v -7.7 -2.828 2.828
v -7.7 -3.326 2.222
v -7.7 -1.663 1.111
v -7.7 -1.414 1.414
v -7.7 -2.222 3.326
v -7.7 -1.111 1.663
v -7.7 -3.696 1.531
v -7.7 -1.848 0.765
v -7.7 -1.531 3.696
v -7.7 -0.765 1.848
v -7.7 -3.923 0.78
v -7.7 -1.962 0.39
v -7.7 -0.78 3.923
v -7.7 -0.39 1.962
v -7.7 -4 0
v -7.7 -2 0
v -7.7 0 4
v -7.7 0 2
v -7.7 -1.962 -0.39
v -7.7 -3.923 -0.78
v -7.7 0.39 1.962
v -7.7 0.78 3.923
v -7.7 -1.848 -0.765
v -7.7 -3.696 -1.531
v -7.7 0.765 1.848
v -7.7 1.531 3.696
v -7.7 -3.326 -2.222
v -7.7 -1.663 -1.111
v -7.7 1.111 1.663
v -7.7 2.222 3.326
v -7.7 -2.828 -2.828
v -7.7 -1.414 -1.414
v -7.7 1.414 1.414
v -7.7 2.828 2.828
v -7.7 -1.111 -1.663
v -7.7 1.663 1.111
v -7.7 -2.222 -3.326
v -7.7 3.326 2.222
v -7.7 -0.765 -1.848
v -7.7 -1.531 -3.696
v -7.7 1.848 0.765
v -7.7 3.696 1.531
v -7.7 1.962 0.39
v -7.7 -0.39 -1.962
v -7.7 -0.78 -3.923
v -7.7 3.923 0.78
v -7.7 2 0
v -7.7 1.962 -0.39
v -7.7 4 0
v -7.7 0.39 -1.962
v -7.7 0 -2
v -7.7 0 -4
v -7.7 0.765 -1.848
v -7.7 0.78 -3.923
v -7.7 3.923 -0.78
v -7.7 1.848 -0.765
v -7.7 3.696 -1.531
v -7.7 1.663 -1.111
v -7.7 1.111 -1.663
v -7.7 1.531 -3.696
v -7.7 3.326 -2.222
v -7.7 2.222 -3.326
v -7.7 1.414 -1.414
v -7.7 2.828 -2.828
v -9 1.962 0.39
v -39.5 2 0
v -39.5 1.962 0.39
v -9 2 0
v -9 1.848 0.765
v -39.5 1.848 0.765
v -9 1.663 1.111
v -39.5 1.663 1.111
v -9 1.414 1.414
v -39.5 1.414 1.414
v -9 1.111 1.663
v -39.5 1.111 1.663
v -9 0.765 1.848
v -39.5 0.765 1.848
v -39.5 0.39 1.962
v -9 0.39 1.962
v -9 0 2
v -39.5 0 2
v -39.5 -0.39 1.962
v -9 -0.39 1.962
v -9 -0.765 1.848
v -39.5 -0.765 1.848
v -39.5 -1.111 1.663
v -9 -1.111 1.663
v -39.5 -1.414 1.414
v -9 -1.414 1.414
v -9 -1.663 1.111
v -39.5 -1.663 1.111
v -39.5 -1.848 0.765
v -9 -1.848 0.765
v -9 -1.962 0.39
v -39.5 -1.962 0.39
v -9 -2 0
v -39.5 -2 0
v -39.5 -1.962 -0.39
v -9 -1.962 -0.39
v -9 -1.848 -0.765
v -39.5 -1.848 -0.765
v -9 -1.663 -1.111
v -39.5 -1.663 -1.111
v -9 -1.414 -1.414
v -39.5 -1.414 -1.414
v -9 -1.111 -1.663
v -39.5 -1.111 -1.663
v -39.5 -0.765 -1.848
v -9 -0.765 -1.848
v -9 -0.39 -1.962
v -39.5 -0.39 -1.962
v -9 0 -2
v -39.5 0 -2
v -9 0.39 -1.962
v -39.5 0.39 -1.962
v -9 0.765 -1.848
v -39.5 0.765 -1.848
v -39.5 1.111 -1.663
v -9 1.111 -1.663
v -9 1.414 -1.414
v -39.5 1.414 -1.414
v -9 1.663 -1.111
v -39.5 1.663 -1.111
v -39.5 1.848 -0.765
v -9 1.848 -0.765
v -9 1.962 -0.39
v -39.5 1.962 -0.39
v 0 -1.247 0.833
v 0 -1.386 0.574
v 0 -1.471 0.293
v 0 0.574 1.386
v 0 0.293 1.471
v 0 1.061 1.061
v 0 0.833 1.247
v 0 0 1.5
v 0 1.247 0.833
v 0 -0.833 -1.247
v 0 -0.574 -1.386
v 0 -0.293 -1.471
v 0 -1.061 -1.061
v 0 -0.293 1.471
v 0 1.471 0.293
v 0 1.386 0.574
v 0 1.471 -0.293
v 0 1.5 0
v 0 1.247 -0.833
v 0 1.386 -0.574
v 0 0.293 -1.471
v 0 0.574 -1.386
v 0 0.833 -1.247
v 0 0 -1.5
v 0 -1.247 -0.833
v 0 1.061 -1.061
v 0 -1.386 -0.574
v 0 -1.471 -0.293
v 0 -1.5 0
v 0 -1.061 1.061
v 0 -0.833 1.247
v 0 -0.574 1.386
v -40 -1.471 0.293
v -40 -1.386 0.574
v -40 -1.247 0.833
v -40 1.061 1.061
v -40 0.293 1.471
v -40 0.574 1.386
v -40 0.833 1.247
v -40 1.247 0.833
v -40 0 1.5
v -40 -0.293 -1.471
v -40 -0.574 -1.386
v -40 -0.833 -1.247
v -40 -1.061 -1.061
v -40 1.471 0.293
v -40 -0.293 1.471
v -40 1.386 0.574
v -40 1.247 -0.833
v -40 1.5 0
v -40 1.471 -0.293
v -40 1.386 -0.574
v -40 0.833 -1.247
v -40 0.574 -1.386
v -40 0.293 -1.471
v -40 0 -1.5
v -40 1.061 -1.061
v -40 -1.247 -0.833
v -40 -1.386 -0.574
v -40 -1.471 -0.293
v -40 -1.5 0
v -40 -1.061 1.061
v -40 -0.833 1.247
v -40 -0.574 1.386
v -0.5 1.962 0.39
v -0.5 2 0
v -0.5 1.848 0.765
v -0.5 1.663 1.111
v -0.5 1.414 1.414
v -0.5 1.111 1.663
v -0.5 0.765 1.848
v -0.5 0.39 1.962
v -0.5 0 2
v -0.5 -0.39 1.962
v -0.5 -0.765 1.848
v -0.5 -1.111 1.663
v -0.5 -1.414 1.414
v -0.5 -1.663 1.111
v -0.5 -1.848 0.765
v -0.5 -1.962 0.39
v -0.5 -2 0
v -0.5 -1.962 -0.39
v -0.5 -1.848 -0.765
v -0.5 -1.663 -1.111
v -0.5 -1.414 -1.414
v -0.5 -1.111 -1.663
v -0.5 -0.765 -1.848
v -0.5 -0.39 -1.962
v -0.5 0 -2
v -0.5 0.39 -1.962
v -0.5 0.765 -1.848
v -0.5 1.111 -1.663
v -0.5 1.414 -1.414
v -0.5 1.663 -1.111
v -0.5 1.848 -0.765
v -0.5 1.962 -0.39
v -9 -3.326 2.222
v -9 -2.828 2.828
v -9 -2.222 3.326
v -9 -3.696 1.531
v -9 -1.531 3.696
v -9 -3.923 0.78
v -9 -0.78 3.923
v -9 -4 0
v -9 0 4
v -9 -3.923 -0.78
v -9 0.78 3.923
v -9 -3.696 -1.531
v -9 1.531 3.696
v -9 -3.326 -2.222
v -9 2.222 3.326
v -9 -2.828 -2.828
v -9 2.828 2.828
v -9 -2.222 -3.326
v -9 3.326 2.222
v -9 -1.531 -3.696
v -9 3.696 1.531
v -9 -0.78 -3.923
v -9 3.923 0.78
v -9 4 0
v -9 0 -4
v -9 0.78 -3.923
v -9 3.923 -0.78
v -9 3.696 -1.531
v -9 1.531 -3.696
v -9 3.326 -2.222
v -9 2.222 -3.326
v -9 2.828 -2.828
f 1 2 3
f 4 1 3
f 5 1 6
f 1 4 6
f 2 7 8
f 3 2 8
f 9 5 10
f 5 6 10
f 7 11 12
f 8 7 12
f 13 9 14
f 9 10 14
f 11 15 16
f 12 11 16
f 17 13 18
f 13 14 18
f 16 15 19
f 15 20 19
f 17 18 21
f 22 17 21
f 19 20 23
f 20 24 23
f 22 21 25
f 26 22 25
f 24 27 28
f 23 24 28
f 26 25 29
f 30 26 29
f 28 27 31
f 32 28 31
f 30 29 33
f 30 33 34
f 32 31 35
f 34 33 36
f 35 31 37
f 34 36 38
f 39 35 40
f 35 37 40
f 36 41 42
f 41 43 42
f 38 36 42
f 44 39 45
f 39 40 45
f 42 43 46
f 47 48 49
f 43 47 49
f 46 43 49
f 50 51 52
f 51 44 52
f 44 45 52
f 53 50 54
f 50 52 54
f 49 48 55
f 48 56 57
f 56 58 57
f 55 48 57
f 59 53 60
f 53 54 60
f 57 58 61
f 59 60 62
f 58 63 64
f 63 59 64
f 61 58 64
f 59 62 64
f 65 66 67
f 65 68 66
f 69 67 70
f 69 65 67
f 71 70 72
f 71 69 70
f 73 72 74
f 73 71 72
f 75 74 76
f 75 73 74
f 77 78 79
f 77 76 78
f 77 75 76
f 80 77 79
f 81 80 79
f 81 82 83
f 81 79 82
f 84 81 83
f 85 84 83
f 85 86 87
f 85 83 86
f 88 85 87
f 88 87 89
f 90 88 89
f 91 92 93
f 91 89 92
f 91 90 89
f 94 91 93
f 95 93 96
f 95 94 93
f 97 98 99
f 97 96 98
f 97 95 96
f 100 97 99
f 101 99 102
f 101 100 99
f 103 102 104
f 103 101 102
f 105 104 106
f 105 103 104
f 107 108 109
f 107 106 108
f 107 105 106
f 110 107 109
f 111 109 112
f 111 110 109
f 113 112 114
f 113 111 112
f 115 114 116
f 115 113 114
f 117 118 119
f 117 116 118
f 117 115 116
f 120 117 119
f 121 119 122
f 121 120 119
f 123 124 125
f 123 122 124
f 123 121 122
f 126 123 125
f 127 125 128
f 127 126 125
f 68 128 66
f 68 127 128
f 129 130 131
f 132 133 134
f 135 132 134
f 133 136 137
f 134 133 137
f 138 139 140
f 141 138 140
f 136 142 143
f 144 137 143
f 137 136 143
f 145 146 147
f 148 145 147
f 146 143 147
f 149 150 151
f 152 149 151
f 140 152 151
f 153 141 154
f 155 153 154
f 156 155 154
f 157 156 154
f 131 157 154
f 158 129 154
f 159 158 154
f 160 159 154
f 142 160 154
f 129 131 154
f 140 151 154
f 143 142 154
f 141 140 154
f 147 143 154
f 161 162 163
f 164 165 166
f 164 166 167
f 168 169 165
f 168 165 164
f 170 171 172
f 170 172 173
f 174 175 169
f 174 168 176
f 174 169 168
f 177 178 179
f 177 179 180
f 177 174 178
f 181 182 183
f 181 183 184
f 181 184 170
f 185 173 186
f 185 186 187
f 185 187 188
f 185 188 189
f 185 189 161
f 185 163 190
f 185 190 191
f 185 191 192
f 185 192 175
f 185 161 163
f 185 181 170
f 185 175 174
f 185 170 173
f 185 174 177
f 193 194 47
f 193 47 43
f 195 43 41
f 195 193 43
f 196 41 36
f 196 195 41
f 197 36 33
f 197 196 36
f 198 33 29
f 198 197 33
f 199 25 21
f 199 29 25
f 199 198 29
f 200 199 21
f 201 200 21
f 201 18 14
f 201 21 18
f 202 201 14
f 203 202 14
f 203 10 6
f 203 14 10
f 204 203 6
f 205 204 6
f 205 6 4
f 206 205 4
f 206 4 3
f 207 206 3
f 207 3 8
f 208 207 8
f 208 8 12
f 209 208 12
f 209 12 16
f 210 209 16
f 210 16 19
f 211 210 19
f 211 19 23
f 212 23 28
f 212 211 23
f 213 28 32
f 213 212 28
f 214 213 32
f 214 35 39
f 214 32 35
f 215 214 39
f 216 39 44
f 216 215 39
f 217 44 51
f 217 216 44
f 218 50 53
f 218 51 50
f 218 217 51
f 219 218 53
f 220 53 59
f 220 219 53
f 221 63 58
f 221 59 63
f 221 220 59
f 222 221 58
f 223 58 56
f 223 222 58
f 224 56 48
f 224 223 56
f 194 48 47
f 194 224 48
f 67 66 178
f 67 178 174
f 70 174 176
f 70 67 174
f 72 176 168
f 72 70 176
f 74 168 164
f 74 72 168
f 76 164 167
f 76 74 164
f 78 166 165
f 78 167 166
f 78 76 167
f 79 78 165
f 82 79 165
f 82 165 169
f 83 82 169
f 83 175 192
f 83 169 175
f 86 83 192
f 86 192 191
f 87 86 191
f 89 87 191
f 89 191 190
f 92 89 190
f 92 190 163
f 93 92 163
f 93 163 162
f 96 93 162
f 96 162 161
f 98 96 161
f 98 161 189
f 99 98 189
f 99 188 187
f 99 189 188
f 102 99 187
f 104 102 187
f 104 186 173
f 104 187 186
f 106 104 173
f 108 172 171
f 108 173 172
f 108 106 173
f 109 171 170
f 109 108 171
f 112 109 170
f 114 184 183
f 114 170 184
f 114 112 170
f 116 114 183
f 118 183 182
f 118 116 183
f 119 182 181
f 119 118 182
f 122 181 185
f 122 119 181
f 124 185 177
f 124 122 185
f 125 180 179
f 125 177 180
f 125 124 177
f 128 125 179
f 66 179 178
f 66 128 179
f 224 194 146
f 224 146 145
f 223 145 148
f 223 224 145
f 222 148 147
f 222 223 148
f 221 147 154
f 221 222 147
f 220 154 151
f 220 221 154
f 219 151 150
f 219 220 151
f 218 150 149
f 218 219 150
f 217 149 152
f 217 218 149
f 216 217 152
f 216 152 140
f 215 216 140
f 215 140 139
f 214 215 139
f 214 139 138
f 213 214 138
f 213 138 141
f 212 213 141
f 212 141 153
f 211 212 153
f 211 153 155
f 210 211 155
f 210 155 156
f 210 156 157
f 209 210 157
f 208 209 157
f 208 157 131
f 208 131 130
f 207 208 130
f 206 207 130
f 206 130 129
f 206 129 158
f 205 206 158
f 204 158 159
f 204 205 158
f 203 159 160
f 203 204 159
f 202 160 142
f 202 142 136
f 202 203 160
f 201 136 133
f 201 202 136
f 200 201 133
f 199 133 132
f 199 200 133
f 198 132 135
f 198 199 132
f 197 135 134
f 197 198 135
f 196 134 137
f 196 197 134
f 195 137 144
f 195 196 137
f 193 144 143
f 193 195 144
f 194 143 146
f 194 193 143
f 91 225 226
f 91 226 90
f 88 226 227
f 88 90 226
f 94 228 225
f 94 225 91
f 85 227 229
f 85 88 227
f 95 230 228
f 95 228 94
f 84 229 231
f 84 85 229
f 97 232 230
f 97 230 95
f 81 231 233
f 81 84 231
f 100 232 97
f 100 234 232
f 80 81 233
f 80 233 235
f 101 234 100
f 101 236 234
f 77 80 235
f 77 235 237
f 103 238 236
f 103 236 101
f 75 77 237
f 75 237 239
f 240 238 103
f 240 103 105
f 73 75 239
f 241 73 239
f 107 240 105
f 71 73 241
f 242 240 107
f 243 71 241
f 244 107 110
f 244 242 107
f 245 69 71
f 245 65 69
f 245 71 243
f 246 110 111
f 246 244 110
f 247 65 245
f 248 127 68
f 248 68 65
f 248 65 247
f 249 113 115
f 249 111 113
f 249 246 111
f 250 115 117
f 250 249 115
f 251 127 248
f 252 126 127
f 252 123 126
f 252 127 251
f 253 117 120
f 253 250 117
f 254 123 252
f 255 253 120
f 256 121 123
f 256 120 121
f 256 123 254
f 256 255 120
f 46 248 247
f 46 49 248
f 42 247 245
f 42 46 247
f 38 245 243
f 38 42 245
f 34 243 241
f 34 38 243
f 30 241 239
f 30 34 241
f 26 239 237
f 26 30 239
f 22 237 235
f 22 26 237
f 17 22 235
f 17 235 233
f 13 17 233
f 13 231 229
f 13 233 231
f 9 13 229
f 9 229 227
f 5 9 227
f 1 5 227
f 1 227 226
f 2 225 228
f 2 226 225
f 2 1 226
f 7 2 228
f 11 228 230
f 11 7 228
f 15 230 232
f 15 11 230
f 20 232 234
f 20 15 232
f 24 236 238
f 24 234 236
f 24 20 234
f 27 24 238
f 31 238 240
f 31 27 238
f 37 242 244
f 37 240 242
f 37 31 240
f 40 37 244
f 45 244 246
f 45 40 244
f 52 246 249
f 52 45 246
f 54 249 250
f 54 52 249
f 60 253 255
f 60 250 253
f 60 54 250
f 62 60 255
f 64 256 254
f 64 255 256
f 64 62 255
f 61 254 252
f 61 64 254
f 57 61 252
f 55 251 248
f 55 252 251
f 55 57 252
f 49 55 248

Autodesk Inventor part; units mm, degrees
ref_plane "YZ Plane" through (0, 0, 0) normal (1, 0, 0) x (0, 1, 0)
ref_plane "XZ Plane" through (0, 0, 0) normal (0, 1, 0) x (-1, 0, 0)
ref_plane "XY Plane" through (0, 0, 0) normal (0, 0, 1) x (1, 0, 0)
sketch "Sketch1" plane through (0, 0, 0) normal (0, 0, 1) x (1, 0, 0)
  line L0 (0, 0) -> (-40, 0)
  line L1 (-40, 0) -> (-40, 1.5)
  line L2 (-40, 1.5) -> (-39.5, 2)
  line L3 (-39.5, 2) -> (-9, 2)
  line L4 (-9, 2) -> (-9, 4)
  line L5 (-9, 4) -> (-7.7, 4)
  line L6 (-7.7, 4) -> (-7.7, 2)
  line L7 (-7.7, 2) -> (-0.5, 2)
  line L8 (-0.5, 2) -> (0, 1.5)
  line L9 (0, 1.5) -> (0, 0)
  dimension "d0" = 4
  dimension "d1" = 8
  dimension "d2" = 40
  dimension "d3" = 0.5
  dimension "d4" = 45
  dimension "d5" = 45
  dimension "d6" = 0.5
  dimension "d7" = 1.3
  dimension "d8" = 7.7
revolve "Revolution1" add sketch "Sketch1" angle 360 about axis through (0, 0, 0) along (-1, 0, 0)
properties part number "18102021-002-05" material "Stainless Steel"
